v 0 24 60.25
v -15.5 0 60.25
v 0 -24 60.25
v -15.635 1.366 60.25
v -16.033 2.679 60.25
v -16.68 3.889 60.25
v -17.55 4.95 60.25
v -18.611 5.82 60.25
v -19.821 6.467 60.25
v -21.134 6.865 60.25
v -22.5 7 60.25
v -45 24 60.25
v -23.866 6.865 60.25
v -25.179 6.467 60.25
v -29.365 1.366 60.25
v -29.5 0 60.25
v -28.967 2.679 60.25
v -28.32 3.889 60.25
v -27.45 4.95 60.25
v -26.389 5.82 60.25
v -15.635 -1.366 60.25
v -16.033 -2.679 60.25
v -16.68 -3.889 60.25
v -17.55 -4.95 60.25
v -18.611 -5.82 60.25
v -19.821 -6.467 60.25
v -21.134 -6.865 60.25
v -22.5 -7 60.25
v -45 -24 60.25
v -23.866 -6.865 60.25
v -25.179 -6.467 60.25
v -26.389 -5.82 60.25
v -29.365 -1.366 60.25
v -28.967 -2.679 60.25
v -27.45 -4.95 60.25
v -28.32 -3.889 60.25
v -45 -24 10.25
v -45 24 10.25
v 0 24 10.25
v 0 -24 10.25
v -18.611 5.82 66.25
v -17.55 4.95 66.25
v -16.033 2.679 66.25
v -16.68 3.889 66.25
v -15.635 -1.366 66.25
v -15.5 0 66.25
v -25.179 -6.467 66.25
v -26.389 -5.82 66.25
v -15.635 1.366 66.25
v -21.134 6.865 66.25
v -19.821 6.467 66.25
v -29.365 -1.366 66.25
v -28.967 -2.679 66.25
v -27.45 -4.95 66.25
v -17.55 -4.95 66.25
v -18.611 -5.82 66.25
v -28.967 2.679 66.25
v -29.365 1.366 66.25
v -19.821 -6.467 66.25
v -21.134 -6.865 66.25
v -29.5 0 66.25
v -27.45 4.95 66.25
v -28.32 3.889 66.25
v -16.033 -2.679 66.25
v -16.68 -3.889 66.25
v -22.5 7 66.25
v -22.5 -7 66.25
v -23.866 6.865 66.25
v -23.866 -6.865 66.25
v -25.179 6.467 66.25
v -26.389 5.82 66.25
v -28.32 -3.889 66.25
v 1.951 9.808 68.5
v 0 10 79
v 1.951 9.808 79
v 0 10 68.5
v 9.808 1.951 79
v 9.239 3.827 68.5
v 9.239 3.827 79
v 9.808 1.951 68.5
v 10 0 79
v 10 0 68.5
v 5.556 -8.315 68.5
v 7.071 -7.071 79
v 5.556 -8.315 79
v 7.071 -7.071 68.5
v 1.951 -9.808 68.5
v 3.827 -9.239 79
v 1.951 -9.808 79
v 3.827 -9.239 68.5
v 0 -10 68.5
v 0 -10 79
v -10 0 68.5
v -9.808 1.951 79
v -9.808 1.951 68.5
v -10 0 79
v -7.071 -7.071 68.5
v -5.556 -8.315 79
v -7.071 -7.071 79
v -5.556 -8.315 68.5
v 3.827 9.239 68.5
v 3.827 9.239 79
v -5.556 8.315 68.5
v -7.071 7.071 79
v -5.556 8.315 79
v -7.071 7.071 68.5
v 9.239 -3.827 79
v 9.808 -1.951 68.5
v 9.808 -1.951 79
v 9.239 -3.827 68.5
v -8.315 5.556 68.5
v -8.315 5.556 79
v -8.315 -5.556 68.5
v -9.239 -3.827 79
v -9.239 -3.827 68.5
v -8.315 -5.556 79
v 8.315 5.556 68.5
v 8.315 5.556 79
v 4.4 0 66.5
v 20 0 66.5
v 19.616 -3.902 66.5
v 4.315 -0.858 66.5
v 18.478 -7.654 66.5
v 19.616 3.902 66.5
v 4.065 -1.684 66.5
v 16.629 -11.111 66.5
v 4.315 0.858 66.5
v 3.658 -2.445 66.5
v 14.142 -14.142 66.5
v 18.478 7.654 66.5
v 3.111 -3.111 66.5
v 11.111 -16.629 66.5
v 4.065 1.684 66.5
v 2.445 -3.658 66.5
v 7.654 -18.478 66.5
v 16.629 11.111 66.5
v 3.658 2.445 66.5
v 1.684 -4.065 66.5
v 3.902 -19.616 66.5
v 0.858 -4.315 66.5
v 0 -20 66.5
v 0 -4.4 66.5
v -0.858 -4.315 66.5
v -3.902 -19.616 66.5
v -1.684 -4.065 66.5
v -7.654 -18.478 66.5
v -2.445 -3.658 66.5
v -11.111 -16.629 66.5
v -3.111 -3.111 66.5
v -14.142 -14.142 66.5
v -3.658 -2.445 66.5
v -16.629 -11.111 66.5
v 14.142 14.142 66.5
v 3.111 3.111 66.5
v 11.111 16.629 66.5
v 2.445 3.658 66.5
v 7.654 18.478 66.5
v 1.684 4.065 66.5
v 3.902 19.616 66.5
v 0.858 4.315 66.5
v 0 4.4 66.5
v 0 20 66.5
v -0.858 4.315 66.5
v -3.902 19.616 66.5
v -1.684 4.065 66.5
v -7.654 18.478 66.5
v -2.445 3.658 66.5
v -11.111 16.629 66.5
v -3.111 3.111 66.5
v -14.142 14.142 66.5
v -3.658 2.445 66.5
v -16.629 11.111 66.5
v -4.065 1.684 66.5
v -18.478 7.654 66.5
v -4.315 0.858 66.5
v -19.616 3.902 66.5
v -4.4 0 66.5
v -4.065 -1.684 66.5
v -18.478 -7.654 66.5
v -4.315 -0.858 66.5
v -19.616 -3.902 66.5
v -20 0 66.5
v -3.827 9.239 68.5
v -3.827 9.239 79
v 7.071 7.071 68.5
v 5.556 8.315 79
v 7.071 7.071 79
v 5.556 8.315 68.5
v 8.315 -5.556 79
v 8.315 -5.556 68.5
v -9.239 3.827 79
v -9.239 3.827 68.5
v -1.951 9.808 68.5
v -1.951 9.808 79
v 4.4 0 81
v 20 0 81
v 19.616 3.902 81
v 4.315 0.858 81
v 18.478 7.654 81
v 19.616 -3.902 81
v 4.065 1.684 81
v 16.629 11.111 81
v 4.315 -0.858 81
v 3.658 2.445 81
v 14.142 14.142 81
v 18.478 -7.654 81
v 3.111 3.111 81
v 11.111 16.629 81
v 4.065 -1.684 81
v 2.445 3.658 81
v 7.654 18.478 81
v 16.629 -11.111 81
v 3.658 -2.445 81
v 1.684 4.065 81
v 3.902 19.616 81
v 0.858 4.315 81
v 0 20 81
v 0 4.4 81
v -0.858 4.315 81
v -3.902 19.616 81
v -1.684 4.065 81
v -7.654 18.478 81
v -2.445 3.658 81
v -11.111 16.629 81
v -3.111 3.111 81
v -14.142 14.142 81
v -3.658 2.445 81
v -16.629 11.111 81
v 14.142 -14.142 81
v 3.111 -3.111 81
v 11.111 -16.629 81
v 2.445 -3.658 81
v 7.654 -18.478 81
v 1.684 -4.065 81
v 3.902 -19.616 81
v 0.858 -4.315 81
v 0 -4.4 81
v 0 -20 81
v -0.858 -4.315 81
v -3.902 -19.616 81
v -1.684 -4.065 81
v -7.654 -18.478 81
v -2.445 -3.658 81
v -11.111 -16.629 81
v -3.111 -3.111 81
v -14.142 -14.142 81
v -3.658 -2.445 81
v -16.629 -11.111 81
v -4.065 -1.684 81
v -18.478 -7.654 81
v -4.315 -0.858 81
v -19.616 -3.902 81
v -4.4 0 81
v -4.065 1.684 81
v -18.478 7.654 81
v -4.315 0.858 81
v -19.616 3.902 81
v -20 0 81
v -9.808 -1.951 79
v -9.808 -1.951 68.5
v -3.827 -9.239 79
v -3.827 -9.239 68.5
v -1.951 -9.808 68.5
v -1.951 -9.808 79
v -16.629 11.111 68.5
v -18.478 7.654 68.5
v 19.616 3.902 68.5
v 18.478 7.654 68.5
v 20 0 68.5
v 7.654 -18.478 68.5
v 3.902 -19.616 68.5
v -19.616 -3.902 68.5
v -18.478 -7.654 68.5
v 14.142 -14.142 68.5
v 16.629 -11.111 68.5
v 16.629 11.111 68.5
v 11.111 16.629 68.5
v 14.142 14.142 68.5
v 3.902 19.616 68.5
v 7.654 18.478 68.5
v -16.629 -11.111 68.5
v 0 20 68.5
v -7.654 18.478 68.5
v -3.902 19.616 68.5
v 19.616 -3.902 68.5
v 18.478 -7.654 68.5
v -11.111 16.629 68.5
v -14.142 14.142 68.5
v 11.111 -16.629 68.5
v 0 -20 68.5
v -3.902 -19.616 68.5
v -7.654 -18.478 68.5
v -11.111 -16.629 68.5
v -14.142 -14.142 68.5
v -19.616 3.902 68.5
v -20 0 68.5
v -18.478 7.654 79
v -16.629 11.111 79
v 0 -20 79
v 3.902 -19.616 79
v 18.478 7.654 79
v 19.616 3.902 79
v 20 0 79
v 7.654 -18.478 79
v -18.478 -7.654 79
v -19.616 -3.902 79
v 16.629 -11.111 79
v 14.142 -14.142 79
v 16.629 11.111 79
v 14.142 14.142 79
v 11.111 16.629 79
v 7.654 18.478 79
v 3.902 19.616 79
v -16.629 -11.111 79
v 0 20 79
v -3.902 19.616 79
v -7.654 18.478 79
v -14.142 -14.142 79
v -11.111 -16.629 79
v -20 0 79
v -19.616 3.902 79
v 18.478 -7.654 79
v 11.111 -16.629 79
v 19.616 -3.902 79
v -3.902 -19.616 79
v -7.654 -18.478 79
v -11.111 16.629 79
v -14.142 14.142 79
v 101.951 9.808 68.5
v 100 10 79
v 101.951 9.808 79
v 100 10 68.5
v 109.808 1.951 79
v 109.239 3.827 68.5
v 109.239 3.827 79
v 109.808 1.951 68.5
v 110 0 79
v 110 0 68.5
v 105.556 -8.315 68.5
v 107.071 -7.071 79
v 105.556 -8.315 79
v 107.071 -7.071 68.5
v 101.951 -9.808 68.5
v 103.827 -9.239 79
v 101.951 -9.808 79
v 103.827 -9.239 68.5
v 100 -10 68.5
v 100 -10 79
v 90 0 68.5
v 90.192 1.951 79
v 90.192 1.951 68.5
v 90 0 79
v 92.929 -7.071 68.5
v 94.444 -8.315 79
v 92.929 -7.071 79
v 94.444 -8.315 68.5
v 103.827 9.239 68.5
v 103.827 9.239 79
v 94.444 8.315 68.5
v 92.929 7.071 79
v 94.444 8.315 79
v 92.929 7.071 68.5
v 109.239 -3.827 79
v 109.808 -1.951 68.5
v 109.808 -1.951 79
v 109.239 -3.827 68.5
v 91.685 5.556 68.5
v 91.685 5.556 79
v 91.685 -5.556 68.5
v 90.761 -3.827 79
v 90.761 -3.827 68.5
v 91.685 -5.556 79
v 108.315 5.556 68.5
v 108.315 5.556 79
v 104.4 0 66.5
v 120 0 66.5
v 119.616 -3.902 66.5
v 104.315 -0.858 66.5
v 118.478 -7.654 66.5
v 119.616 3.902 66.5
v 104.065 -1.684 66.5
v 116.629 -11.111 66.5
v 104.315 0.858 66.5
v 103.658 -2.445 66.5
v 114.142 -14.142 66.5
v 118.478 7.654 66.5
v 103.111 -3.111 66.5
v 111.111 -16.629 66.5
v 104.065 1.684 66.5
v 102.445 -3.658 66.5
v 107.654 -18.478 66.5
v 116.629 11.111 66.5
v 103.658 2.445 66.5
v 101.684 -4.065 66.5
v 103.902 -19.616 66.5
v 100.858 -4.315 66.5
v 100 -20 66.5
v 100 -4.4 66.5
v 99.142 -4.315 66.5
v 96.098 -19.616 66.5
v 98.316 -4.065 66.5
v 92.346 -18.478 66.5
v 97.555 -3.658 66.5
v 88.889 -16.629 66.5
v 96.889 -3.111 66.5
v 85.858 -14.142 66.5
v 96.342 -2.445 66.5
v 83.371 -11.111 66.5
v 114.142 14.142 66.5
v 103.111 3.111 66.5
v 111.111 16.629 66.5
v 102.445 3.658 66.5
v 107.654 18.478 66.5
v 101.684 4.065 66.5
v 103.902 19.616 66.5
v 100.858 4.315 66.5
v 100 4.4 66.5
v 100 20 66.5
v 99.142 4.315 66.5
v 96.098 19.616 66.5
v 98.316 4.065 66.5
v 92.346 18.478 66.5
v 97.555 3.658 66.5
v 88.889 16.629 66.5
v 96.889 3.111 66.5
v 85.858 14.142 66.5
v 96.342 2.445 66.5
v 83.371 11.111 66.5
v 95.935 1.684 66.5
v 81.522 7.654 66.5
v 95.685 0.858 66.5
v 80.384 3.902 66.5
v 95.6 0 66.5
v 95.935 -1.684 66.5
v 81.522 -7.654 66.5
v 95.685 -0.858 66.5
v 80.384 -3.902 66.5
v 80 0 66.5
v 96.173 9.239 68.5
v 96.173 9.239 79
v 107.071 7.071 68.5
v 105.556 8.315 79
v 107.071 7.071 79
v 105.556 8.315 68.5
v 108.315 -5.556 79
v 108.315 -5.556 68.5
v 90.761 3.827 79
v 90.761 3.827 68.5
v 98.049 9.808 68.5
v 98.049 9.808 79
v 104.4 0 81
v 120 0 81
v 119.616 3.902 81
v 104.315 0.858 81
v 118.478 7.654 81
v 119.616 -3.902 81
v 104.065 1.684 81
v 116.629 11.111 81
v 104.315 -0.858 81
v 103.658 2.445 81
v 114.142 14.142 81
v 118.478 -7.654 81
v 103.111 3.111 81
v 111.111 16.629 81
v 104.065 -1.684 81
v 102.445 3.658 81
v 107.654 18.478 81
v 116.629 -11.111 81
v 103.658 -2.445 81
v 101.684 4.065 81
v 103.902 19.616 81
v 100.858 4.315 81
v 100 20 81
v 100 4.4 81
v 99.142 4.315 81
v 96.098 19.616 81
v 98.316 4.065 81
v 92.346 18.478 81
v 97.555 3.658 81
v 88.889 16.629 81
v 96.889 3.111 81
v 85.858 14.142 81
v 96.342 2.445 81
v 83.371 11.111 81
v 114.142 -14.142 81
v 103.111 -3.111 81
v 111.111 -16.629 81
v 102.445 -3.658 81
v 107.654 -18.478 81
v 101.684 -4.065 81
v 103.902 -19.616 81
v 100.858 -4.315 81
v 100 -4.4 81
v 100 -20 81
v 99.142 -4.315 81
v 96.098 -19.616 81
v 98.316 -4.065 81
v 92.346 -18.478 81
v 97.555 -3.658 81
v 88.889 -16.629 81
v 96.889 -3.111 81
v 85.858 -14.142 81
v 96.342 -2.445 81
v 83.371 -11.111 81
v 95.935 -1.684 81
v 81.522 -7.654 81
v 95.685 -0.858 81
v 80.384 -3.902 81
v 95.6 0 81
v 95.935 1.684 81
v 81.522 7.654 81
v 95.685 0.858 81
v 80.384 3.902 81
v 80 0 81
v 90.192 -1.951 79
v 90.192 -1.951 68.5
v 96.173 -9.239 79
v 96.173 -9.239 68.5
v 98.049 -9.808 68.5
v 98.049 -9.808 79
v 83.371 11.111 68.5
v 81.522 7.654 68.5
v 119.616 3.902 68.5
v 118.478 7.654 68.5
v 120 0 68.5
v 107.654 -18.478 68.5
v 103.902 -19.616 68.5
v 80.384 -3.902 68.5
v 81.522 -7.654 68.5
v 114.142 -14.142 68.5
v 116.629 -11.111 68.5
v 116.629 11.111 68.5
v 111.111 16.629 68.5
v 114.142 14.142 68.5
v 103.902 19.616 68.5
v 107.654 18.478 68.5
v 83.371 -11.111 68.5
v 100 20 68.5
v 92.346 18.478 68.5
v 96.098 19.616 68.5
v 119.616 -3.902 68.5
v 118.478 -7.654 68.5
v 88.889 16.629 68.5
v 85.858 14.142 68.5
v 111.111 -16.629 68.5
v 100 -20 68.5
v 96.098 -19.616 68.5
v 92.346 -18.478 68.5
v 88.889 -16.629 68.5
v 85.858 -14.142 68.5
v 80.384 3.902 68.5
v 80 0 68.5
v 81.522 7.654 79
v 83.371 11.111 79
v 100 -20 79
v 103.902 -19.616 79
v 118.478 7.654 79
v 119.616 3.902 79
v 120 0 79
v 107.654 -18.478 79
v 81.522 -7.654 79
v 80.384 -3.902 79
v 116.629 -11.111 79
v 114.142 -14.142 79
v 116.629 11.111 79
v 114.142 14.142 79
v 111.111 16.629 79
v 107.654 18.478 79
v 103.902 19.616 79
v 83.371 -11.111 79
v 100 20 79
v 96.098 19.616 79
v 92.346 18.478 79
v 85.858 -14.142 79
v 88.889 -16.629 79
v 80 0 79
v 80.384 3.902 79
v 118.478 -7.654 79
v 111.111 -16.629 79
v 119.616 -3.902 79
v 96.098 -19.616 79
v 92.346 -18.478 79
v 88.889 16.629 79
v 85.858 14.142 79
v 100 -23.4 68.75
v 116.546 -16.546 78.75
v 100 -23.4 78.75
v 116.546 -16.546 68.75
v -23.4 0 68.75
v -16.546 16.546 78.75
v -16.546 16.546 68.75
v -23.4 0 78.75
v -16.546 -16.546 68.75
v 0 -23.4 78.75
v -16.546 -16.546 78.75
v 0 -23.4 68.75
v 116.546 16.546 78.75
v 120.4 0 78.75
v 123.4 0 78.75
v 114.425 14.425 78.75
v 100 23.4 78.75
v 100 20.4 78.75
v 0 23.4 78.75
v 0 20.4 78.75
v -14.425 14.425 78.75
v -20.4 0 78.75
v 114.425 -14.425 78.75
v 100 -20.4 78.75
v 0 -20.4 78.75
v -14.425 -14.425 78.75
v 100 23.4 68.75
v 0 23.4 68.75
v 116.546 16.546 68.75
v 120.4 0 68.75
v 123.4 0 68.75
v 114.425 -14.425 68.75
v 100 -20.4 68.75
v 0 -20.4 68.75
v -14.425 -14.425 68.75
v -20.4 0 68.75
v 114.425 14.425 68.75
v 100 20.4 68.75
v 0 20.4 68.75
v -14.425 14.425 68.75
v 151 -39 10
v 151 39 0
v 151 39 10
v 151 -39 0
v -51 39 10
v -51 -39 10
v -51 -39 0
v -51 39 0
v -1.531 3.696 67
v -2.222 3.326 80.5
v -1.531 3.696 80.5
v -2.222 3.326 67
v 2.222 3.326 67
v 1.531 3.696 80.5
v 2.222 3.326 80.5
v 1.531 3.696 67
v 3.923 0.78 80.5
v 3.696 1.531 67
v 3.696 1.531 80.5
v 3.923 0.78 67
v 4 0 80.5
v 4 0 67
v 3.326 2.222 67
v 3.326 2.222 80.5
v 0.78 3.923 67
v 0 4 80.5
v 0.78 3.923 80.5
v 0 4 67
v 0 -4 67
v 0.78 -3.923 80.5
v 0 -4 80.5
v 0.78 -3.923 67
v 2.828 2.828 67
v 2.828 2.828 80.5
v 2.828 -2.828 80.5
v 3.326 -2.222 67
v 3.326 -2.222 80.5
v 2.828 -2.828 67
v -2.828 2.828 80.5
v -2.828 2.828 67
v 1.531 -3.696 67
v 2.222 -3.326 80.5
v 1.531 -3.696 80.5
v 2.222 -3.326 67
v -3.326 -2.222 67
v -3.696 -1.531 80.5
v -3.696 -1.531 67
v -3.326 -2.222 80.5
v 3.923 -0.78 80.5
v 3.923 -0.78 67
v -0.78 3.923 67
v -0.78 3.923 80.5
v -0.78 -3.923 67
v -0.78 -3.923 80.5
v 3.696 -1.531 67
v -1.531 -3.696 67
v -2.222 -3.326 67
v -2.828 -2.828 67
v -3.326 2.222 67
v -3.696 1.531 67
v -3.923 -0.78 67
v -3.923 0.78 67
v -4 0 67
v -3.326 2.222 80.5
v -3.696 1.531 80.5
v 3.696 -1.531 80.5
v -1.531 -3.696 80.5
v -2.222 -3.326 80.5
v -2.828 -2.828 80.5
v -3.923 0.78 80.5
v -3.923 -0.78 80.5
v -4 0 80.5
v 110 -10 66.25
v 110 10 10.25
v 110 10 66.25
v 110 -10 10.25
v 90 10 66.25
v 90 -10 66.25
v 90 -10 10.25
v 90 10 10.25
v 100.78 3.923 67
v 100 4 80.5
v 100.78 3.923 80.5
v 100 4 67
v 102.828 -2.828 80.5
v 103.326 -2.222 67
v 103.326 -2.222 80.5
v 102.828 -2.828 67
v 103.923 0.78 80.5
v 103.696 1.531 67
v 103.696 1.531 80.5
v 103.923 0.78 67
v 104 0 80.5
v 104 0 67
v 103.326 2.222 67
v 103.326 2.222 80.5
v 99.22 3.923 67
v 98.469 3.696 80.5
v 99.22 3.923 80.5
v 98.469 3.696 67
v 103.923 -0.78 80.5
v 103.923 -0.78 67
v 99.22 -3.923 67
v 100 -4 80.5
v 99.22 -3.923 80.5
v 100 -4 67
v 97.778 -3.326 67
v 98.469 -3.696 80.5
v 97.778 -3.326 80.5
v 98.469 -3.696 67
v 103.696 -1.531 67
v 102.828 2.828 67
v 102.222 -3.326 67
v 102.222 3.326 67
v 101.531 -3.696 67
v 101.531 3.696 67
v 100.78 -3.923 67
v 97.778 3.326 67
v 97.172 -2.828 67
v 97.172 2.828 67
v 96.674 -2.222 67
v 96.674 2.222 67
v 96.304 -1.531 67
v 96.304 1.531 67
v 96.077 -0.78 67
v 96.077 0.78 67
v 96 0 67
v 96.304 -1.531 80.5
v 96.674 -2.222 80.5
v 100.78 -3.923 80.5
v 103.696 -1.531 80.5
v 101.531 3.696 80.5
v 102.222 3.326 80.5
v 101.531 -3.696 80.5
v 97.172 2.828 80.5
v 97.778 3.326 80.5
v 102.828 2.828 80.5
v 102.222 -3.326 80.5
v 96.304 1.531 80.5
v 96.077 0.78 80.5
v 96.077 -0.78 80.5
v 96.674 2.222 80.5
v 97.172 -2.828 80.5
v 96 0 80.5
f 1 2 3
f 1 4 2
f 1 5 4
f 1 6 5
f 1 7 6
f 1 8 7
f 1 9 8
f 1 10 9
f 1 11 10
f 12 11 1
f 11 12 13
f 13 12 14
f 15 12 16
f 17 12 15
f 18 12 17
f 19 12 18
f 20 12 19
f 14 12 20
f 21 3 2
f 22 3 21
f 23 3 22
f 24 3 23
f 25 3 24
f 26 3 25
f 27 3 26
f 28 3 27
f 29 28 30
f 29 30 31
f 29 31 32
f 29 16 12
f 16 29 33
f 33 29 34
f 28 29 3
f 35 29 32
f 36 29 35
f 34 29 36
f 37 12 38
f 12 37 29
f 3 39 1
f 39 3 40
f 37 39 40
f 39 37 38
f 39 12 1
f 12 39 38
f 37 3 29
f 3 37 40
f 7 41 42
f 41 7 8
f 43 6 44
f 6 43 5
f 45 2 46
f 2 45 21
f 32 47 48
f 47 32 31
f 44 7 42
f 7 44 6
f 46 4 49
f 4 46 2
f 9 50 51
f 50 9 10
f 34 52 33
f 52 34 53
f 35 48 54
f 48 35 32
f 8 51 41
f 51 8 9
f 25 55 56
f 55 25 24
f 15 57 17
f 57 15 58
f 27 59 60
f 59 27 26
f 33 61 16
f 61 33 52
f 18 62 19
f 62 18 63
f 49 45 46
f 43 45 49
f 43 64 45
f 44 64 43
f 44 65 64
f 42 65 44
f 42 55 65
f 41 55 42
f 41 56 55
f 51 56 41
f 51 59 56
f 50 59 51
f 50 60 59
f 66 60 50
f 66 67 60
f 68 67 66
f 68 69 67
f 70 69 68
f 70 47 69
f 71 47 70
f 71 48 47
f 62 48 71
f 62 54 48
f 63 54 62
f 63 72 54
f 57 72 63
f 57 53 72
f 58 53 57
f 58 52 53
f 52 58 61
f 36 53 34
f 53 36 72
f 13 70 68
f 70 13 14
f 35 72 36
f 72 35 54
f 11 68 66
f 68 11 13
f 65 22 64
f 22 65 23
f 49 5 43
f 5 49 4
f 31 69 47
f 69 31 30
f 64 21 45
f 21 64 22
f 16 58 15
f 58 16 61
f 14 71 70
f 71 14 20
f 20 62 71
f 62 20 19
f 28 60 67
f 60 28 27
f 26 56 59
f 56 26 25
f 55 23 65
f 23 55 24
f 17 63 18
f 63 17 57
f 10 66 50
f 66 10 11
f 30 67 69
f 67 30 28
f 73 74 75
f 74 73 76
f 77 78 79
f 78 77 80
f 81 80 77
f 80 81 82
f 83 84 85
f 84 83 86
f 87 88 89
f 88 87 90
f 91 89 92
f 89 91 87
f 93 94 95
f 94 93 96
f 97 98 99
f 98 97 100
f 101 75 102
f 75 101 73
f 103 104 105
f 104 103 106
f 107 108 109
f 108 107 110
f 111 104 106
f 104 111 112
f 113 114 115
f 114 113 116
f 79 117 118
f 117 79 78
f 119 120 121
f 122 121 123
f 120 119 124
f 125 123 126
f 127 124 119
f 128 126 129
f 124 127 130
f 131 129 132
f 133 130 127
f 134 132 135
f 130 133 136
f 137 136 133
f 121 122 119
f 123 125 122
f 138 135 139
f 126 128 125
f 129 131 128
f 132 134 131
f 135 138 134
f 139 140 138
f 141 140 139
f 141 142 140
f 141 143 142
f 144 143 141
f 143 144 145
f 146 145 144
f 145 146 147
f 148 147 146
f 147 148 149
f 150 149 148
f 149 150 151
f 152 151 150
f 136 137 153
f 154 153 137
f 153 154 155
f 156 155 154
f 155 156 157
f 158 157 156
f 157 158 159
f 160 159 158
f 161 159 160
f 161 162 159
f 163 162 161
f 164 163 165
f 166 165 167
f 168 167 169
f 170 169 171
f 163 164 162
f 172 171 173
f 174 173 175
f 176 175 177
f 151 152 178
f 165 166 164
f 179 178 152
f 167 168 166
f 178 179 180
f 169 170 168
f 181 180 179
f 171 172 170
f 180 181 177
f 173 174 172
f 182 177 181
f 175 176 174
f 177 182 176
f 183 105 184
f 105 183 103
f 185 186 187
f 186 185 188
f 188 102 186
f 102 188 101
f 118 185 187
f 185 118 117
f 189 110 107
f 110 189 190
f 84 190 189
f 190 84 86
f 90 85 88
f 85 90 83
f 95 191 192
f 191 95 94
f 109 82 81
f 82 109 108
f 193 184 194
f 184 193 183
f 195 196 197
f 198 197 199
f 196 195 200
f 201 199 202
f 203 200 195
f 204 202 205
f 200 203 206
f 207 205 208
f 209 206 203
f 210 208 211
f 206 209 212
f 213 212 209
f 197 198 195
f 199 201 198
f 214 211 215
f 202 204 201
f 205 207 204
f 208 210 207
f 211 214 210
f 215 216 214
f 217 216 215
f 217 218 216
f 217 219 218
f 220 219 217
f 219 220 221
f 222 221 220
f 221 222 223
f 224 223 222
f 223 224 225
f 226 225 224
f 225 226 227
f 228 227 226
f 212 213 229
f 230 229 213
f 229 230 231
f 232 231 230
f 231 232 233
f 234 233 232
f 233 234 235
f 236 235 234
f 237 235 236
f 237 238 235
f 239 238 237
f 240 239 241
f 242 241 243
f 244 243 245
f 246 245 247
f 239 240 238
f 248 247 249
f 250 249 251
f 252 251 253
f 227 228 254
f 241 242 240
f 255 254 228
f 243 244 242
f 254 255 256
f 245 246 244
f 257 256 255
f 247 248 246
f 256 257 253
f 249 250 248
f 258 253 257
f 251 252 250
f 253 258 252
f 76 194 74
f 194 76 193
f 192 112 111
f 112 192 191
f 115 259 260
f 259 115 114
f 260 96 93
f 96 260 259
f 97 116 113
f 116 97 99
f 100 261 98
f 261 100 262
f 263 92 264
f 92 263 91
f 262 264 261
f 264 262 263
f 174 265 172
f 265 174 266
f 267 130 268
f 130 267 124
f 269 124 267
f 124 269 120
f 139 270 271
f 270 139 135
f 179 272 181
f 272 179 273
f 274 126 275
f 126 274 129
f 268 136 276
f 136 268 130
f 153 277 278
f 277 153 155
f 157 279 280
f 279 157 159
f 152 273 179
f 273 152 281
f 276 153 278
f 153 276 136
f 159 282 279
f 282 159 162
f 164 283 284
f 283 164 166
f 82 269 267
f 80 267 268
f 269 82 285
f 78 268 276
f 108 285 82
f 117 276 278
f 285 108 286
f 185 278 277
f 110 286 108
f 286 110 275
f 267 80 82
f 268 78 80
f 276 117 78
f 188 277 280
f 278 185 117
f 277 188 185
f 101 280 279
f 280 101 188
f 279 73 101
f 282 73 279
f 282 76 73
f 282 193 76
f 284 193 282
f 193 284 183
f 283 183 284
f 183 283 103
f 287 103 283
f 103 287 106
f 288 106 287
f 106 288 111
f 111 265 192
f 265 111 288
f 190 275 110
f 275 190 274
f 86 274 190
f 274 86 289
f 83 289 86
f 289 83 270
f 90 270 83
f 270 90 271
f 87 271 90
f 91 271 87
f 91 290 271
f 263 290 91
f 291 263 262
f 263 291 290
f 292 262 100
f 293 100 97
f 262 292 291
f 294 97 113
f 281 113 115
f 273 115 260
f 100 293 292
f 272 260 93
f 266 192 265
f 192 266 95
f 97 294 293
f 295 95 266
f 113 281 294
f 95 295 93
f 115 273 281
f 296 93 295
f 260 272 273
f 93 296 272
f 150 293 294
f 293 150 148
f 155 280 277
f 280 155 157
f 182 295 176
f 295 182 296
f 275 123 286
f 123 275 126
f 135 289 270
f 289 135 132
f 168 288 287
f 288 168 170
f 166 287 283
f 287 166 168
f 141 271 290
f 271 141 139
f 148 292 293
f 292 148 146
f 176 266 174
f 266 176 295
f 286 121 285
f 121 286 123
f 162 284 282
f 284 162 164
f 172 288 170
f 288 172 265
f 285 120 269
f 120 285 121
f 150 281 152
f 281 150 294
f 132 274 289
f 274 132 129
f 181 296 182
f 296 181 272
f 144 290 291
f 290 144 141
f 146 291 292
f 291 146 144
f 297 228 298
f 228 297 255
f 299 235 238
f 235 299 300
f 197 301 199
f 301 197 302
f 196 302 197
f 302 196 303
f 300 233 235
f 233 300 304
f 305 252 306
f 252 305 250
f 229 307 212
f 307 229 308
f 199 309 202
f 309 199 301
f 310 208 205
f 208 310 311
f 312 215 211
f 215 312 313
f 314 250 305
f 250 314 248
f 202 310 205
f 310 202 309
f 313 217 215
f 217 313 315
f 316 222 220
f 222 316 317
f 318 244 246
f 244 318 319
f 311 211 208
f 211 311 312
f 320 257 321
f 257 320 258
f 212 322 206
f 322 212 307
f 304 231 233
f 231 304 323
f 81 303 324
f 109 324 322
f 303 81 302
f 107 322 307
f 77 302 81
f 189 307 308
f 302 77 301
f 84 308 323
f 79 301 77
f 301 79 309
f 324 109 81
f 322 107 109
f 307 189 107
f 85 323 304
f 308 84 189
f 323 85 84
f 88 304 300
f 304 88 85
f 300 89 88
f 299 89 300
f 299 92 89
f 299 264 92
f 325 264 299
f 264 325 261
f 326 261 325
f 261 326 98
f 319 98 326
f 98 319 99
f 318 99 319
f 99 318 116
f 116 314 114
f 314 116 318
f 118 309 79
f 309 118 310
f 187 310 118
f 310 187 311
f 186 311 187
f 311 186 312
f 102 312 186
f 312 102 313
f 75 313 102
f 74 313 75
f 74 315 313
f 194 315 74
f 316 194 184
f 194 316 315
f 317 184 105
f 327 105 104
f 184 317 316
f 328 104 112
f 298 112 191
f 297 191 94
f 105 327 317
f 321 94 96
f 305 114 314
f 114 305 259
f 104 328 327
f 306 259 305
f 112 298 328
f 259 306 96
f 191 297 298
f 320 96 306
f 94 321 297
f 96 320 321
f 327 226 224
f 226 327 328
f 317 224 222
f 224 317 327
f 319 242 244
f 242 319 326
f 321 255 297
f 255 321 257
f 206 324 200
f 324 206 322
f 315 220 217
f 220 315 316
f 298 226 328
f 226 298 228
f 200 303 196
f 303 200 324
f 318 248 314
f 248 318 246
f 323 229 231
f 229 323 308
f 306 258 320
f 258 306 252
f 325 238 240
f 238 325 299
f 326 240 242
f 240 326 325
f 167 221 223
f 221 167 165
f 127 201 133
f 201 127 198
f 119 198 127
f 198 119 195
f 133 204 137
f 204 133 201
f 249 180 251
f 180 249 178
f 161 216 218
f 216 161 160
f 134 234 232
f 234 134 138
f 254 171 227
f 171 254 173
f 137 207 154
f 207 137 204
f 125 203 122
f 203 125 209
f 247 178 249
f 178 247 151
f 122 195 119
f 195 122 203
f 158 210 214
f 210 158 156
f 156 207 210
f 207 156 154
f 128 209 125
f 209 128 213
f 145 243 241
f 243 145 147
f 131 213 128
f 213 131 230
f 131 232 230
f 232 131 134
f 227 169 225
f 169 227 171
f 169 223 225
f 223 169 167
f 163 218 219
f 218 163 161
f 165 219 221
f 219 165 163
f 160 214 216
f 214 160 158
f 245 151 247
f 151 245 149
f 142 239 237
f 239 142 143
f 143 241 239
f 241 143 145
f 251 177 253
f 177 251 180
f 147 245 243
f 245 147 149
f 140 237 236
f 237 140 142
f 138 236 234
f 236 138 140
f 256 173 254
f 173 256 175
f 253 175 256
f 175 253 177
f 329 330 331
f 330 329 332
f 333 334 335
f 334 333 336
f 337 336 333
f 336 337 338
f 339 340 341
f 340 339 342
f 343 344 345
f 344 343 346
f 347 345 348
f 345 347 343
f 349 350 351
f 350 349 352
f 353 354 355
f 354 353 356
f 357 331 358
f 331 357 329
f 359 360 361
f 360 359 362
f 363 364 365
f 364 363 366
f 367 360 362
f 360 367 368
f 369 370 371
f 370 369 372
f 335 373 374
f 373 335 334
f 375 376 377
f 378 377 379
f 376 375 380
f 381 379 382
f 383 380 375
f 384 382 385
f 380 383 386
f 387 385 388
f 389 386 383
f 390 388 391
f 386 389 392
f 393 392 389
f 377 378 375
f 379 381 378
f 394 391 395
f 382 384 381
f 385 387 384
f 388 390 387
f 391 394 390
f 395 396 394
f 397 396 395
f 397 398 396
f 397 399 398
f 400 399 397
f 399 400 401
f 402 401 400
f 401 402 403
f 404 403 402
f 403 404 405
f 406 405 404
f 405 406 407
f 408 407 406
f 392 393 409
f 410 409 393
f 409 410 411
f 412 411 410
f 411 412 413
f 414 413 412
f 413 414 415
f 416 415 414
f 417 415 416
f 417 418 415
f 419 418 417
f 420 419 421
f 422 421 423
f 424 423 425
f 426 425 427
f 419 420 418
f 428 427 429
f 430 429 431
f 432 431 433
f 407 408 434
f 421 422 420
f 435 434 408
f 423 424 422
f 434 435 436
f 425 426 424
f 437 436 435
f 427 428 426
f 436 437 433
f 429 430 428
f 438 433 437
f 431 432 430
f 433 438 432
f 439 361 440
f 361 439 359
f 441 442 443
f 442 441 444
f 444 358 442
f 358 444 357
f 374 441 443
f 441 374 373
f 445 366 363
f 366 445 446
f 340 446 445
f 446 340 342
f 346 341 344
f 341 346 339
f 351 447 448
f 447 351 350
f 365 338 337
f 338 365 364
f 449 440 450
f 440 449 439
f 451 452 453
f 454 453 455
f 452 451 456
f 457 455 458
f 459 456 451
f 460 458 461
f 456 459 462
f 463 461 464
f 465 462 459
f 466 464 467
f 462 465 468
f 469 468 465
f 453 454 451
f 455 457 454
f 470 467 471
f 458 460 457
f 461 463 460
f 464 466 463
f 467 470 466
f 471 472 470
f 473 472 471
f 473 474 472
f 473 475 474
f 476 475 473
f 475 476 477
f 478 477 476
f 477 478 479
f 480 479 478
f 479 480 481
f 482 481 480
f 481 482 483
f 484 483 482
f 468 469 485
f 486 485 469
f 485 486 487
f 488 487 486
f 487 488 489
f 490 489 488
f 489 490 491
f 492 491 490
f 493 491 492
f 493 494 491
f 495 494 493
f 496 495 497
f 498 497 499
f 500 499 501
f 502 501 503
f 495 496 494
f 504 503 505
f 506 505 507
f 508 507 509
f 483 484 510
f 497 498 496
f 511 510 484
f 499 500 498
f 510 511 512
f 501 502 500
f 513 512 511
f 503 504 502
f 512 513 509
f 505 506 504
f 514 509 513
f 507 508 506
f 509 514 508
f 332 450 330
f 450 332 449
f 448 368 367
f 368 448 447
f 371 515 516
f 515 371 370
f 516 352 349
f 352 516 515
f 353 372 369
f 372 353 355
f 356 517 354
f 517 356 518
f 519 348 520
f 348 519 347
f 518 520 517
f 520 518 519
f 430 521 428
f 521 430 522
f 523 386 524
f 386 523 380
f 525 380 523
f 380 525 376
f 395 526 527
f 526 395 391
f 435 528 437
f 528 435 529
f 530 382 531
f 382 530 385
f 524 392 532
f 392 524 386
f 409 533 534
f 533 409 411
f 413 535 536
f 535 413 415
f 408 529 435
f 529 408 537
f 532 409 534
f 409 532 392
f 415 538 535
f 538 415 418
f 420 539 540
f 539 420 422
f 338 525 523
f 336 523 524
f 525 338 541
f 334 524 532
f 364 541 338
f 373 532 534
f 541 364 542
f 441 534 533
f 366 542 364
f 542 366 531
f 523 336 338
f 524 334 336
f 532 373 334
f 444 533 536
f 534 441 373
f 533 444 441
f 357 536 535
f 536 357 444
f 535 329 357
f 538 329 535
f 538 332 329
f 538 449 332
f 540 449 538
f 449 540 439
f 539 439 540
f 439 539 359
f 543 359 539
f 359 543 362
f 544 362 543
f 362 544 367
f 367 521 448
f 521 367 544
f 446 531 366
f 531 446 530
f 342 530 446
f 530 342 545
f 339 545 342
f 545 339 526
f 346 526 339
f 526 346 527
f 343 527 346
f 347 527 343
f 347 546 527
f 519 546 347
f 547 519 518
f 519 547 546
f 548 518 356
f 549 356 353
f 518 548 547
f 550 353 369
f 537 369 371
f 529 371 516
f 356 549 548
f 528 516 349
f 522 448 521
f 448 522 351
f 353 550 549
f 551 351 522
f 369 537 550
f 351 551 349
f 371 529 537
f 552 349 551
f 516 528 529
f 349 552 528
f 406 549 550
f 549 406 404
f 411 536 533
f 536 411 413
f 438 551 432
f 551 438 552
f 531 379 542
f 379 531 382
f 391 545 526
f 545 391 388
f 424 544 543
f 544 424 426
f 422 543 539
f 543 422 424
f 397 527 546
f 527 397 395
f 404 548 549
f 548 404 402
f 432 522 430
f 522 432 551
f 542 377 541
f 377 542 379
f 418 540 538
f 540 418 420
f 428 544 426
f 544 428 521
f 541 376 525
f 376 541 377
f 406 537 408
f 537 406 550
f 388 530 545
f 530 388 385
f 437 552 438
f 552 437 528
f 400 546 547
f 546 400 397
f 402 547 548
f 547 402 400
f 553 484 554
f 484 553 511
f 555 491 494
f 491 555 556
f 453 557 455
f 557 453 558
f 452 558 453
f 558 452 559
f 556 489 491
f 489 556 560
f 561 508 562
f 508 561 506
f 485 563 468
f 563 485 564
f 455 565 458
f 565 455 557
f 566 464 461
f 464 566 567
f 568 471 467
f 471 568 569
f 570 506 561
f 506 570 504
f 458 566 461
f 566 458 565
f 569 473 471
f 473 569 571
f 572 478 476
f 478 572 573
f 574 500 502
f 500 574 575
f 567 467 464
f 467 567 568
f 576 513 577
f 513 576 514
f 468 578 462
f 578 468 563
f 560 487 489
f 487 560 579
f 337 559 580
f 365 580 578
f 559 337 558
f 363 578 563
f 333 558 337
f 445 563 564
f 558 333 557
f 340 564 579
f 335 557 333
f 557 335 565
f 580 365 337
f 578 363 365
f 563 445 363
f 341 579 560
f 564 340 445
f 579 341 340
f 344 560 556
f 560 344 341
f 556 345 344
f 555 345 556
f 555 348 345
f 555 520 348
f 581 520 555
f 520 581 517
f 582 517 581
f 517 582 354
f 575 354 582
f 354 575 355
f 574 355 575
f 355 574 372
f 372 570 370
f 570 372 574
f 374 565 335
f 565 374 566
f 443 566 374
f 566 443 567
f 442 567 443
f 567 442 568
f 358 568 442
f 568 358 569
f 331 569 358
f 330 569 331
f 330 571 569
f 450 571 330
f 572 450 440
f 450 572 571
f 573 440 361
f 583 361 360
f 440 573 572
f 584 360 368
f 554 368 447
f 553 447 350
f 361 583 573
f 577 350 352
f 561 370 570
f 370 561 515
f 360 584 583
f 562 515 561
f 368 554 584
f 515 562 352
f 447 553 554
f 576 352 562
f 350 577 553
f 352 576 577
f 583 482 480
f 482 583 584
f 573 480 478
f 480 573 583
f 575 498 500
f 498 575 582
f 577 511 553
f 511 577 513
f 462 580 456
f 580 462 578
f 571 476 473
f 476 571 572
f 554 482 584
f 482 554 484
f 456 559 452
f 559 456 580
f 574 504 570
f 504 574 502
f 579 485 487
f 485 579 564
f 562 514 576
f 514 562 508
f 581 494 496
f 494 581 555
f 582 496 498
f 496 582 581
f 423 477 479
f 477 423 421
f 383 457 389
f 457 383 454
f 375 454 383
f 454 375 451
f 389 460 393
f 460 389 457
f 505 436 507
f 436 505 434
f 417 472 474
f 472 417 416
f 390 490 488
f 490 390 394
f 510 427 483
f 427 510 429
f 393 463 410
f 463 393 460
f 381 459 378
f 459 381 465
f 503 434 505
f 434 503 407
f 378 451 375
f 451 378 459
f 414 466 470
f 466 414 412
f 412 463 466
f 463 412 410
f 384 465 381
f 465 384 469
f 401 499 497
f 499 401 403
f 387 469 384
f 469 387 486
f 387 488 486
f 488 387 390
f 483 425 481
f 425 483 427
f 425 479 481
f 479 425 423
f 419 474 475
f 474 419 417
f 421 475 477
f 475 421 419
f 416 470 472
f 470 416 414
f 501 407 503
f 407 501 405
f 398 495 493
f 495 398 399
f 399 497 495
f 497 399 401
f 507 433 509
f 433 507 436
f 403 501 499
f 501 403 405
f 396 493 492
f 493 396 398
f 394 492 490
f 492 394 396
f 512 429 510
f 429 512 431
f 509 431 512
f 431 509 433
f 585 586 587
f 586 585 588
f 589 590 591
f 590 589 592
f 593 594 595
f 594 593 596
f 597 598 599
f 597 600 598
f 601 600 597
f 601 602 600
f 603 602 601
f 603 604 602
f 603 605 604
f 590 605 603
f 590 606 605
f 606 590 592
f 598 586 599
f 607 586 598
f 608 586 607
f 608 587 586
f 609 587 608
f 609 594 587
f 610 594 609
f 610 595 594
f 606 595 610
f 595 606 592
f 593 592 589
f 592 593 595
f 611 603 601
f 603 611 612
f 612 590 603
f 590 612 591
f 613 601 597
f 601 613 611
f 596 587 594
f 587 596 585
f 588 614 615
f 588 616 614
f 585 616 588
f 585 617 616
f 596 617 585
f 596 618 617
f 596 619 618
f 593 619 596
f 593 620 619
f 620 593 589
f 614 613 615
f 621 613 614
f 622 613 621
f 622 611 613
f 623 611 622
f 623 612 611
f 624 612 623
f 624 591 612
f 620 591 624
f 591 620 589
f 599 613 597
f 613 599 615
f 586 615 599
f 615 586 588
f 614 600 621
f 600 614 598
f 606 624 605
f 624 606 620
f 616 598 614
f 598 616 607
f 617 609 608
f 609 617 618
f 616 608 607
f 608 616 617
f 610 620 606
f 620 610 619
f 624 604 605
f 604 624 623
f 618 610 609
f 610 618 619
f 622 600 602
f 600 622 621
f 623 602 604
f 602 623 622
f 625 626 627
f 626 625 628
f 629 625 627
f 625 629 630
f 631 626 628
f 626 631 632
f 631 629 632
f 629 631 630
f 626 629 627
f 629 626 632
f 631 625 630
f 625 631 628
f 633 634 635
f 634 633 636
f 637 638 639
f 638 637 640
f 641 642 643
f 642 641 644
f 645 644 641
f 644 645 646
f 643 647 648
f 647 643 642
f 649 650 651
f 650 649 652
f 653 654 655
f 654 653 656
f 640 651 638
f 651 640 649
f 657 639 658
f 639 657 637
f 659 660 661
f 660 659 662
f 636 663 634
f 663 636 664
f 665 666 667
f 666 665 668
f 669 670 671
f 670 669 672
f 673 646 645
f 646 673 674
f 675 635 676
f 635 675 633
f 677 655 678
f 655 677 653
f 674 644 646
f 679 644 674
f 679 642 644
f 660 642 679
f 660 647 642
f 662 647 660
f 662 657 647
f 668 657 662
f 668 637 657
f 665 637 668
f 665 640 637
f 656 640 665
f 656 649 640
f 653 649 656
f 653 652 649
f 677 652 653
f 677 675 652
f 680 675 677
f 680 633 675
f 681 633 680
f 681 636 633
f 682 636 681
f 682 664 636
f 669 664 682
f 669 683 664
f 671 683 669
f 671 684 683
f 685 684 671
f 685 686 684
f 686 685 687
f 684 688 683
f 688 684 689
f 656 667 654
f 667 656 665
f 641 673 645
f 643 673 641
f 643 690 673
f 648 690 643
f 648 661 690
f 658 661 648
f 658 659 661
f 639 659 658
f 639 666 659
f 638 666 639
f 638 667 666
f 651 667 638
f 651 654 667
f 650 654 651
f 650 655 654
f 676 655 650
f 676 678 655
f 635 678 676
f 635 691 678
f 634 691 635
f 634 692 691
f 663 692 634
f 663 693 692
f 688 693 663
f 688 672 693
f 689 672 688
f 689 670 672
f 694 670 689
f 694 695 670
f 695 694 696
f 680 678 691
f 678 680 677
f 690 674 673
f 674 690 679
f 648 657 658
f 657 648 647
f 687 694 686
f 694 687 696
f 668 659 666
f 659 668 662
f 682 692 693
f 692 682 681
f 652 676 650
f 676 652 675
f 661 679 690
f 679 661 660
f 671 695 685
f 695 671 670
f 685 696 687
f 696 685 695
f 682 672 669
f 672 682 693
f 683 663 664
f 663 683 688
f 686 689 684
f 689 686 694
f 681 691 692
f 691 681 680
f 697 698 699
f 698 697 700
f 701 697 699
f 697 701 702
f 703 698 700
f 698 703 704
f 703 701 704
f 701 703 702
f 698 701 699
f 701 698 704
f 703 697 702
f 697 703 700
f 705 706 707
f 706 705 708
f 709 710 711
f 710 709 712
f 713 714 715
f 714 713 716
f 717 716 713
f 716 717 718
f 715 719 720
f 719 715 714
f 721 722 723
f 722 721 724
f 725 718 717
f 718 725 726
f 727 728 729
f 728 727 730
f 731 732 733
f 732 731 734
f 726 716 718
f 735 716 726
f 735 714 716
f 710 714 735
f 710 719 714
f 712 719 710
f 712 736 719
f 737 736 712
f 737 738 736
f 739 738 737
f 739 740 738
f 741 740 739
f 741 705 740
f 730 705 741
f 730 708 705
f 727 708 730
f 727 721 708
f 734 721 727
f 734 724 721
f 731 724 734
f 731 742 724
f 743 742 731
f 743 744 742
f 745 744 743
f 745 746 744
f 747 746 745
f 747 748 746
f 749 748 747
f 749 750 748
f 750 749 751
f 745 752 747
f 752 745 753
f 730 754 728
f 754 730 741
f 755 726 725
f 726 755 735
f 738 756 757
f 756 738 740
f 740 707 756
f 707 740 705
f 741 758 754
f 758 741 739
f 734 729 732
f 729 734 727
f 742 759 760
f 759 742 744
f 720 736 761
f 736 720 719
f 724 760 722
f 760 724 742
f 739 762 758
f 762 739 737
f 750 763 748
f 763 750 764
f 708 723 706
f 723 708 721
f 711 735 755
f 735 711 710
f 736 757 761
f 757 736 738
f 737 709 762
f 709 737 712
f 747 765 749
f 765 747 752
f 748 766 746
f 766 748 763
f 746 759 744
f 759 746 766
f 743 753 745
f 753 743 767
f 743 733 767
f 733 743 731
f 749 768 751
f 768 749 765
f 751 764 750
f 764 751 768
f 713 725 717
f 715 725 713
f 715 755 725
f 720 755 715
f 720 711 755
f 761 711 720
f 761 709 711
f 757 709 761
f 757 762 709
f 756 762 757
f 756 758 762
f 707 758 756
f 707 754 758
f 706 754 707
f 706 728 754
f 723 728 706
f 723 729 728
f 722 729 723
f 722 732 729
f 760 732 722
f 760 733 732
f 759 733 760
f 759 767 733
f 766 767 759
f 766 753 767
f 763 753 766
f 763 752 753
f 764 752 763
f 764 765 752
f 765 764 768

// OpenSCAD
$fn = 32;

// ------------------------------------------------------------------------
// Motor belt drive: span 100 mm, pulleys d40, belt 10 mm wide
// Every part is its own module, assembly() places every instance.
// ------------------------------------------------------------------------

// --- part 1 ---
module base_plate() {
  difference() {
    translate([-101, -39, 0]) cube([202, 78, 10]);
  }
}

// --- part 2 ---
module motor() {
  union() {
    translate([-25, -24, 0]) cube([50, 48, 45]);
    translate([28, 0, 22.5]) rotate([0, 90, 0]) cylinder(h = 6, d = 14, center = true);
  }
}

// --- part 3 ---
module drive_shaft() {
  translate([0, 0, -6.75]) cylinder(h = 13.5, d = 8);
}

// --- part 4 ---
module pulley_drive() {
  difference() {
    union() {
      cylinder(h = 14.5, d = 20);
      cylinder(h = 2, d = 40);
      translate([0, 0, 12.5]) cylinder(h = 2, d = 40);
    }
    translate([0, 0, -1]) cylinder(h = 16.5, d = 8.8);
  }
}

// --- part 5 ---
module idler_post() {
  translate([-10, -10, 0]) cube([20, 20, 56]);
}

// --- part 6 ---
module driven_shaft() {
  translate([0, 0, -6.75]) cylinder(h = 13.5, d = 8);
}

// --- part 7 ---
module pulley_driven() {
  difference() {
    union() {
      cylinder(h = 14.5, d = 20);
      cylinder(h = 2, d = 40);
      translate([0, 0, 12.5]) cylinder(h = 2, d = 40);
    }
    translate([0, 0, -1]) cylinder(h = 16.5, d = 8.8);
  }
}

// --- part 8 ---
module drive_belt() {
  difference() {
    linear_extrude(height = 10) polygon(points = concat([for (a = [90 : 45 : 270]) [23.4 * cos(a), 23.4 * sin(a)]], [for (a = [270 : 45 : 450]) [100 + 23.4 * cos(a), 23.4 * sin(a)]]));
    translate([0, 0, -1]) linear_extrude(height = 12) polygon(points = concat([for (a = [90 : 45 : 270]) [20.4 * cos(a), 20.4 * sin(a)]], [for (a = [270 : 45 : 450]) [100 + 20.4 * cos(a), 20.4 * sin(a)]]));
  }
}

// --- assembly ---
module assembly() {
  color([0.80, 0.24, 0.20]) translate([50, 0, 0]) rotate([0, 0, 0]) base_plate();
  color([0.20, 0.45, 0.75]) translate([0, 0, 35.25]) rotate([0, 270, 0]) motor();
  color([0.25, 0.62, 0.32]) translate([0, 0, 73.75]) rotate([0, 0, 0]) drive_shaft();
  color([0.92, 0.70, 0.18]) translate([0, 0, 66.5]) rotate([0, 0, 0]) pulley_drive();
  color([0.58, 0.35, 0.70]) translate([100, 0, 10.25]) rotate([0, 0, 0]) idler_post();
  color([0.16, 0.66, 0.66]) translate([100, 0, 73.75]) rotate([0, 0, 0]) driven_shaft();
  color([0.85, 0.48, 0.18]) translate([100, 0, 66.5]) rotate([0, 0, 0]) pulley_driven();
  color([0.55, 0.60, 0.65]) translate([0, 0, 68.75]) rotate([0, 0, 0]) drive_belt();
}

assembly();
